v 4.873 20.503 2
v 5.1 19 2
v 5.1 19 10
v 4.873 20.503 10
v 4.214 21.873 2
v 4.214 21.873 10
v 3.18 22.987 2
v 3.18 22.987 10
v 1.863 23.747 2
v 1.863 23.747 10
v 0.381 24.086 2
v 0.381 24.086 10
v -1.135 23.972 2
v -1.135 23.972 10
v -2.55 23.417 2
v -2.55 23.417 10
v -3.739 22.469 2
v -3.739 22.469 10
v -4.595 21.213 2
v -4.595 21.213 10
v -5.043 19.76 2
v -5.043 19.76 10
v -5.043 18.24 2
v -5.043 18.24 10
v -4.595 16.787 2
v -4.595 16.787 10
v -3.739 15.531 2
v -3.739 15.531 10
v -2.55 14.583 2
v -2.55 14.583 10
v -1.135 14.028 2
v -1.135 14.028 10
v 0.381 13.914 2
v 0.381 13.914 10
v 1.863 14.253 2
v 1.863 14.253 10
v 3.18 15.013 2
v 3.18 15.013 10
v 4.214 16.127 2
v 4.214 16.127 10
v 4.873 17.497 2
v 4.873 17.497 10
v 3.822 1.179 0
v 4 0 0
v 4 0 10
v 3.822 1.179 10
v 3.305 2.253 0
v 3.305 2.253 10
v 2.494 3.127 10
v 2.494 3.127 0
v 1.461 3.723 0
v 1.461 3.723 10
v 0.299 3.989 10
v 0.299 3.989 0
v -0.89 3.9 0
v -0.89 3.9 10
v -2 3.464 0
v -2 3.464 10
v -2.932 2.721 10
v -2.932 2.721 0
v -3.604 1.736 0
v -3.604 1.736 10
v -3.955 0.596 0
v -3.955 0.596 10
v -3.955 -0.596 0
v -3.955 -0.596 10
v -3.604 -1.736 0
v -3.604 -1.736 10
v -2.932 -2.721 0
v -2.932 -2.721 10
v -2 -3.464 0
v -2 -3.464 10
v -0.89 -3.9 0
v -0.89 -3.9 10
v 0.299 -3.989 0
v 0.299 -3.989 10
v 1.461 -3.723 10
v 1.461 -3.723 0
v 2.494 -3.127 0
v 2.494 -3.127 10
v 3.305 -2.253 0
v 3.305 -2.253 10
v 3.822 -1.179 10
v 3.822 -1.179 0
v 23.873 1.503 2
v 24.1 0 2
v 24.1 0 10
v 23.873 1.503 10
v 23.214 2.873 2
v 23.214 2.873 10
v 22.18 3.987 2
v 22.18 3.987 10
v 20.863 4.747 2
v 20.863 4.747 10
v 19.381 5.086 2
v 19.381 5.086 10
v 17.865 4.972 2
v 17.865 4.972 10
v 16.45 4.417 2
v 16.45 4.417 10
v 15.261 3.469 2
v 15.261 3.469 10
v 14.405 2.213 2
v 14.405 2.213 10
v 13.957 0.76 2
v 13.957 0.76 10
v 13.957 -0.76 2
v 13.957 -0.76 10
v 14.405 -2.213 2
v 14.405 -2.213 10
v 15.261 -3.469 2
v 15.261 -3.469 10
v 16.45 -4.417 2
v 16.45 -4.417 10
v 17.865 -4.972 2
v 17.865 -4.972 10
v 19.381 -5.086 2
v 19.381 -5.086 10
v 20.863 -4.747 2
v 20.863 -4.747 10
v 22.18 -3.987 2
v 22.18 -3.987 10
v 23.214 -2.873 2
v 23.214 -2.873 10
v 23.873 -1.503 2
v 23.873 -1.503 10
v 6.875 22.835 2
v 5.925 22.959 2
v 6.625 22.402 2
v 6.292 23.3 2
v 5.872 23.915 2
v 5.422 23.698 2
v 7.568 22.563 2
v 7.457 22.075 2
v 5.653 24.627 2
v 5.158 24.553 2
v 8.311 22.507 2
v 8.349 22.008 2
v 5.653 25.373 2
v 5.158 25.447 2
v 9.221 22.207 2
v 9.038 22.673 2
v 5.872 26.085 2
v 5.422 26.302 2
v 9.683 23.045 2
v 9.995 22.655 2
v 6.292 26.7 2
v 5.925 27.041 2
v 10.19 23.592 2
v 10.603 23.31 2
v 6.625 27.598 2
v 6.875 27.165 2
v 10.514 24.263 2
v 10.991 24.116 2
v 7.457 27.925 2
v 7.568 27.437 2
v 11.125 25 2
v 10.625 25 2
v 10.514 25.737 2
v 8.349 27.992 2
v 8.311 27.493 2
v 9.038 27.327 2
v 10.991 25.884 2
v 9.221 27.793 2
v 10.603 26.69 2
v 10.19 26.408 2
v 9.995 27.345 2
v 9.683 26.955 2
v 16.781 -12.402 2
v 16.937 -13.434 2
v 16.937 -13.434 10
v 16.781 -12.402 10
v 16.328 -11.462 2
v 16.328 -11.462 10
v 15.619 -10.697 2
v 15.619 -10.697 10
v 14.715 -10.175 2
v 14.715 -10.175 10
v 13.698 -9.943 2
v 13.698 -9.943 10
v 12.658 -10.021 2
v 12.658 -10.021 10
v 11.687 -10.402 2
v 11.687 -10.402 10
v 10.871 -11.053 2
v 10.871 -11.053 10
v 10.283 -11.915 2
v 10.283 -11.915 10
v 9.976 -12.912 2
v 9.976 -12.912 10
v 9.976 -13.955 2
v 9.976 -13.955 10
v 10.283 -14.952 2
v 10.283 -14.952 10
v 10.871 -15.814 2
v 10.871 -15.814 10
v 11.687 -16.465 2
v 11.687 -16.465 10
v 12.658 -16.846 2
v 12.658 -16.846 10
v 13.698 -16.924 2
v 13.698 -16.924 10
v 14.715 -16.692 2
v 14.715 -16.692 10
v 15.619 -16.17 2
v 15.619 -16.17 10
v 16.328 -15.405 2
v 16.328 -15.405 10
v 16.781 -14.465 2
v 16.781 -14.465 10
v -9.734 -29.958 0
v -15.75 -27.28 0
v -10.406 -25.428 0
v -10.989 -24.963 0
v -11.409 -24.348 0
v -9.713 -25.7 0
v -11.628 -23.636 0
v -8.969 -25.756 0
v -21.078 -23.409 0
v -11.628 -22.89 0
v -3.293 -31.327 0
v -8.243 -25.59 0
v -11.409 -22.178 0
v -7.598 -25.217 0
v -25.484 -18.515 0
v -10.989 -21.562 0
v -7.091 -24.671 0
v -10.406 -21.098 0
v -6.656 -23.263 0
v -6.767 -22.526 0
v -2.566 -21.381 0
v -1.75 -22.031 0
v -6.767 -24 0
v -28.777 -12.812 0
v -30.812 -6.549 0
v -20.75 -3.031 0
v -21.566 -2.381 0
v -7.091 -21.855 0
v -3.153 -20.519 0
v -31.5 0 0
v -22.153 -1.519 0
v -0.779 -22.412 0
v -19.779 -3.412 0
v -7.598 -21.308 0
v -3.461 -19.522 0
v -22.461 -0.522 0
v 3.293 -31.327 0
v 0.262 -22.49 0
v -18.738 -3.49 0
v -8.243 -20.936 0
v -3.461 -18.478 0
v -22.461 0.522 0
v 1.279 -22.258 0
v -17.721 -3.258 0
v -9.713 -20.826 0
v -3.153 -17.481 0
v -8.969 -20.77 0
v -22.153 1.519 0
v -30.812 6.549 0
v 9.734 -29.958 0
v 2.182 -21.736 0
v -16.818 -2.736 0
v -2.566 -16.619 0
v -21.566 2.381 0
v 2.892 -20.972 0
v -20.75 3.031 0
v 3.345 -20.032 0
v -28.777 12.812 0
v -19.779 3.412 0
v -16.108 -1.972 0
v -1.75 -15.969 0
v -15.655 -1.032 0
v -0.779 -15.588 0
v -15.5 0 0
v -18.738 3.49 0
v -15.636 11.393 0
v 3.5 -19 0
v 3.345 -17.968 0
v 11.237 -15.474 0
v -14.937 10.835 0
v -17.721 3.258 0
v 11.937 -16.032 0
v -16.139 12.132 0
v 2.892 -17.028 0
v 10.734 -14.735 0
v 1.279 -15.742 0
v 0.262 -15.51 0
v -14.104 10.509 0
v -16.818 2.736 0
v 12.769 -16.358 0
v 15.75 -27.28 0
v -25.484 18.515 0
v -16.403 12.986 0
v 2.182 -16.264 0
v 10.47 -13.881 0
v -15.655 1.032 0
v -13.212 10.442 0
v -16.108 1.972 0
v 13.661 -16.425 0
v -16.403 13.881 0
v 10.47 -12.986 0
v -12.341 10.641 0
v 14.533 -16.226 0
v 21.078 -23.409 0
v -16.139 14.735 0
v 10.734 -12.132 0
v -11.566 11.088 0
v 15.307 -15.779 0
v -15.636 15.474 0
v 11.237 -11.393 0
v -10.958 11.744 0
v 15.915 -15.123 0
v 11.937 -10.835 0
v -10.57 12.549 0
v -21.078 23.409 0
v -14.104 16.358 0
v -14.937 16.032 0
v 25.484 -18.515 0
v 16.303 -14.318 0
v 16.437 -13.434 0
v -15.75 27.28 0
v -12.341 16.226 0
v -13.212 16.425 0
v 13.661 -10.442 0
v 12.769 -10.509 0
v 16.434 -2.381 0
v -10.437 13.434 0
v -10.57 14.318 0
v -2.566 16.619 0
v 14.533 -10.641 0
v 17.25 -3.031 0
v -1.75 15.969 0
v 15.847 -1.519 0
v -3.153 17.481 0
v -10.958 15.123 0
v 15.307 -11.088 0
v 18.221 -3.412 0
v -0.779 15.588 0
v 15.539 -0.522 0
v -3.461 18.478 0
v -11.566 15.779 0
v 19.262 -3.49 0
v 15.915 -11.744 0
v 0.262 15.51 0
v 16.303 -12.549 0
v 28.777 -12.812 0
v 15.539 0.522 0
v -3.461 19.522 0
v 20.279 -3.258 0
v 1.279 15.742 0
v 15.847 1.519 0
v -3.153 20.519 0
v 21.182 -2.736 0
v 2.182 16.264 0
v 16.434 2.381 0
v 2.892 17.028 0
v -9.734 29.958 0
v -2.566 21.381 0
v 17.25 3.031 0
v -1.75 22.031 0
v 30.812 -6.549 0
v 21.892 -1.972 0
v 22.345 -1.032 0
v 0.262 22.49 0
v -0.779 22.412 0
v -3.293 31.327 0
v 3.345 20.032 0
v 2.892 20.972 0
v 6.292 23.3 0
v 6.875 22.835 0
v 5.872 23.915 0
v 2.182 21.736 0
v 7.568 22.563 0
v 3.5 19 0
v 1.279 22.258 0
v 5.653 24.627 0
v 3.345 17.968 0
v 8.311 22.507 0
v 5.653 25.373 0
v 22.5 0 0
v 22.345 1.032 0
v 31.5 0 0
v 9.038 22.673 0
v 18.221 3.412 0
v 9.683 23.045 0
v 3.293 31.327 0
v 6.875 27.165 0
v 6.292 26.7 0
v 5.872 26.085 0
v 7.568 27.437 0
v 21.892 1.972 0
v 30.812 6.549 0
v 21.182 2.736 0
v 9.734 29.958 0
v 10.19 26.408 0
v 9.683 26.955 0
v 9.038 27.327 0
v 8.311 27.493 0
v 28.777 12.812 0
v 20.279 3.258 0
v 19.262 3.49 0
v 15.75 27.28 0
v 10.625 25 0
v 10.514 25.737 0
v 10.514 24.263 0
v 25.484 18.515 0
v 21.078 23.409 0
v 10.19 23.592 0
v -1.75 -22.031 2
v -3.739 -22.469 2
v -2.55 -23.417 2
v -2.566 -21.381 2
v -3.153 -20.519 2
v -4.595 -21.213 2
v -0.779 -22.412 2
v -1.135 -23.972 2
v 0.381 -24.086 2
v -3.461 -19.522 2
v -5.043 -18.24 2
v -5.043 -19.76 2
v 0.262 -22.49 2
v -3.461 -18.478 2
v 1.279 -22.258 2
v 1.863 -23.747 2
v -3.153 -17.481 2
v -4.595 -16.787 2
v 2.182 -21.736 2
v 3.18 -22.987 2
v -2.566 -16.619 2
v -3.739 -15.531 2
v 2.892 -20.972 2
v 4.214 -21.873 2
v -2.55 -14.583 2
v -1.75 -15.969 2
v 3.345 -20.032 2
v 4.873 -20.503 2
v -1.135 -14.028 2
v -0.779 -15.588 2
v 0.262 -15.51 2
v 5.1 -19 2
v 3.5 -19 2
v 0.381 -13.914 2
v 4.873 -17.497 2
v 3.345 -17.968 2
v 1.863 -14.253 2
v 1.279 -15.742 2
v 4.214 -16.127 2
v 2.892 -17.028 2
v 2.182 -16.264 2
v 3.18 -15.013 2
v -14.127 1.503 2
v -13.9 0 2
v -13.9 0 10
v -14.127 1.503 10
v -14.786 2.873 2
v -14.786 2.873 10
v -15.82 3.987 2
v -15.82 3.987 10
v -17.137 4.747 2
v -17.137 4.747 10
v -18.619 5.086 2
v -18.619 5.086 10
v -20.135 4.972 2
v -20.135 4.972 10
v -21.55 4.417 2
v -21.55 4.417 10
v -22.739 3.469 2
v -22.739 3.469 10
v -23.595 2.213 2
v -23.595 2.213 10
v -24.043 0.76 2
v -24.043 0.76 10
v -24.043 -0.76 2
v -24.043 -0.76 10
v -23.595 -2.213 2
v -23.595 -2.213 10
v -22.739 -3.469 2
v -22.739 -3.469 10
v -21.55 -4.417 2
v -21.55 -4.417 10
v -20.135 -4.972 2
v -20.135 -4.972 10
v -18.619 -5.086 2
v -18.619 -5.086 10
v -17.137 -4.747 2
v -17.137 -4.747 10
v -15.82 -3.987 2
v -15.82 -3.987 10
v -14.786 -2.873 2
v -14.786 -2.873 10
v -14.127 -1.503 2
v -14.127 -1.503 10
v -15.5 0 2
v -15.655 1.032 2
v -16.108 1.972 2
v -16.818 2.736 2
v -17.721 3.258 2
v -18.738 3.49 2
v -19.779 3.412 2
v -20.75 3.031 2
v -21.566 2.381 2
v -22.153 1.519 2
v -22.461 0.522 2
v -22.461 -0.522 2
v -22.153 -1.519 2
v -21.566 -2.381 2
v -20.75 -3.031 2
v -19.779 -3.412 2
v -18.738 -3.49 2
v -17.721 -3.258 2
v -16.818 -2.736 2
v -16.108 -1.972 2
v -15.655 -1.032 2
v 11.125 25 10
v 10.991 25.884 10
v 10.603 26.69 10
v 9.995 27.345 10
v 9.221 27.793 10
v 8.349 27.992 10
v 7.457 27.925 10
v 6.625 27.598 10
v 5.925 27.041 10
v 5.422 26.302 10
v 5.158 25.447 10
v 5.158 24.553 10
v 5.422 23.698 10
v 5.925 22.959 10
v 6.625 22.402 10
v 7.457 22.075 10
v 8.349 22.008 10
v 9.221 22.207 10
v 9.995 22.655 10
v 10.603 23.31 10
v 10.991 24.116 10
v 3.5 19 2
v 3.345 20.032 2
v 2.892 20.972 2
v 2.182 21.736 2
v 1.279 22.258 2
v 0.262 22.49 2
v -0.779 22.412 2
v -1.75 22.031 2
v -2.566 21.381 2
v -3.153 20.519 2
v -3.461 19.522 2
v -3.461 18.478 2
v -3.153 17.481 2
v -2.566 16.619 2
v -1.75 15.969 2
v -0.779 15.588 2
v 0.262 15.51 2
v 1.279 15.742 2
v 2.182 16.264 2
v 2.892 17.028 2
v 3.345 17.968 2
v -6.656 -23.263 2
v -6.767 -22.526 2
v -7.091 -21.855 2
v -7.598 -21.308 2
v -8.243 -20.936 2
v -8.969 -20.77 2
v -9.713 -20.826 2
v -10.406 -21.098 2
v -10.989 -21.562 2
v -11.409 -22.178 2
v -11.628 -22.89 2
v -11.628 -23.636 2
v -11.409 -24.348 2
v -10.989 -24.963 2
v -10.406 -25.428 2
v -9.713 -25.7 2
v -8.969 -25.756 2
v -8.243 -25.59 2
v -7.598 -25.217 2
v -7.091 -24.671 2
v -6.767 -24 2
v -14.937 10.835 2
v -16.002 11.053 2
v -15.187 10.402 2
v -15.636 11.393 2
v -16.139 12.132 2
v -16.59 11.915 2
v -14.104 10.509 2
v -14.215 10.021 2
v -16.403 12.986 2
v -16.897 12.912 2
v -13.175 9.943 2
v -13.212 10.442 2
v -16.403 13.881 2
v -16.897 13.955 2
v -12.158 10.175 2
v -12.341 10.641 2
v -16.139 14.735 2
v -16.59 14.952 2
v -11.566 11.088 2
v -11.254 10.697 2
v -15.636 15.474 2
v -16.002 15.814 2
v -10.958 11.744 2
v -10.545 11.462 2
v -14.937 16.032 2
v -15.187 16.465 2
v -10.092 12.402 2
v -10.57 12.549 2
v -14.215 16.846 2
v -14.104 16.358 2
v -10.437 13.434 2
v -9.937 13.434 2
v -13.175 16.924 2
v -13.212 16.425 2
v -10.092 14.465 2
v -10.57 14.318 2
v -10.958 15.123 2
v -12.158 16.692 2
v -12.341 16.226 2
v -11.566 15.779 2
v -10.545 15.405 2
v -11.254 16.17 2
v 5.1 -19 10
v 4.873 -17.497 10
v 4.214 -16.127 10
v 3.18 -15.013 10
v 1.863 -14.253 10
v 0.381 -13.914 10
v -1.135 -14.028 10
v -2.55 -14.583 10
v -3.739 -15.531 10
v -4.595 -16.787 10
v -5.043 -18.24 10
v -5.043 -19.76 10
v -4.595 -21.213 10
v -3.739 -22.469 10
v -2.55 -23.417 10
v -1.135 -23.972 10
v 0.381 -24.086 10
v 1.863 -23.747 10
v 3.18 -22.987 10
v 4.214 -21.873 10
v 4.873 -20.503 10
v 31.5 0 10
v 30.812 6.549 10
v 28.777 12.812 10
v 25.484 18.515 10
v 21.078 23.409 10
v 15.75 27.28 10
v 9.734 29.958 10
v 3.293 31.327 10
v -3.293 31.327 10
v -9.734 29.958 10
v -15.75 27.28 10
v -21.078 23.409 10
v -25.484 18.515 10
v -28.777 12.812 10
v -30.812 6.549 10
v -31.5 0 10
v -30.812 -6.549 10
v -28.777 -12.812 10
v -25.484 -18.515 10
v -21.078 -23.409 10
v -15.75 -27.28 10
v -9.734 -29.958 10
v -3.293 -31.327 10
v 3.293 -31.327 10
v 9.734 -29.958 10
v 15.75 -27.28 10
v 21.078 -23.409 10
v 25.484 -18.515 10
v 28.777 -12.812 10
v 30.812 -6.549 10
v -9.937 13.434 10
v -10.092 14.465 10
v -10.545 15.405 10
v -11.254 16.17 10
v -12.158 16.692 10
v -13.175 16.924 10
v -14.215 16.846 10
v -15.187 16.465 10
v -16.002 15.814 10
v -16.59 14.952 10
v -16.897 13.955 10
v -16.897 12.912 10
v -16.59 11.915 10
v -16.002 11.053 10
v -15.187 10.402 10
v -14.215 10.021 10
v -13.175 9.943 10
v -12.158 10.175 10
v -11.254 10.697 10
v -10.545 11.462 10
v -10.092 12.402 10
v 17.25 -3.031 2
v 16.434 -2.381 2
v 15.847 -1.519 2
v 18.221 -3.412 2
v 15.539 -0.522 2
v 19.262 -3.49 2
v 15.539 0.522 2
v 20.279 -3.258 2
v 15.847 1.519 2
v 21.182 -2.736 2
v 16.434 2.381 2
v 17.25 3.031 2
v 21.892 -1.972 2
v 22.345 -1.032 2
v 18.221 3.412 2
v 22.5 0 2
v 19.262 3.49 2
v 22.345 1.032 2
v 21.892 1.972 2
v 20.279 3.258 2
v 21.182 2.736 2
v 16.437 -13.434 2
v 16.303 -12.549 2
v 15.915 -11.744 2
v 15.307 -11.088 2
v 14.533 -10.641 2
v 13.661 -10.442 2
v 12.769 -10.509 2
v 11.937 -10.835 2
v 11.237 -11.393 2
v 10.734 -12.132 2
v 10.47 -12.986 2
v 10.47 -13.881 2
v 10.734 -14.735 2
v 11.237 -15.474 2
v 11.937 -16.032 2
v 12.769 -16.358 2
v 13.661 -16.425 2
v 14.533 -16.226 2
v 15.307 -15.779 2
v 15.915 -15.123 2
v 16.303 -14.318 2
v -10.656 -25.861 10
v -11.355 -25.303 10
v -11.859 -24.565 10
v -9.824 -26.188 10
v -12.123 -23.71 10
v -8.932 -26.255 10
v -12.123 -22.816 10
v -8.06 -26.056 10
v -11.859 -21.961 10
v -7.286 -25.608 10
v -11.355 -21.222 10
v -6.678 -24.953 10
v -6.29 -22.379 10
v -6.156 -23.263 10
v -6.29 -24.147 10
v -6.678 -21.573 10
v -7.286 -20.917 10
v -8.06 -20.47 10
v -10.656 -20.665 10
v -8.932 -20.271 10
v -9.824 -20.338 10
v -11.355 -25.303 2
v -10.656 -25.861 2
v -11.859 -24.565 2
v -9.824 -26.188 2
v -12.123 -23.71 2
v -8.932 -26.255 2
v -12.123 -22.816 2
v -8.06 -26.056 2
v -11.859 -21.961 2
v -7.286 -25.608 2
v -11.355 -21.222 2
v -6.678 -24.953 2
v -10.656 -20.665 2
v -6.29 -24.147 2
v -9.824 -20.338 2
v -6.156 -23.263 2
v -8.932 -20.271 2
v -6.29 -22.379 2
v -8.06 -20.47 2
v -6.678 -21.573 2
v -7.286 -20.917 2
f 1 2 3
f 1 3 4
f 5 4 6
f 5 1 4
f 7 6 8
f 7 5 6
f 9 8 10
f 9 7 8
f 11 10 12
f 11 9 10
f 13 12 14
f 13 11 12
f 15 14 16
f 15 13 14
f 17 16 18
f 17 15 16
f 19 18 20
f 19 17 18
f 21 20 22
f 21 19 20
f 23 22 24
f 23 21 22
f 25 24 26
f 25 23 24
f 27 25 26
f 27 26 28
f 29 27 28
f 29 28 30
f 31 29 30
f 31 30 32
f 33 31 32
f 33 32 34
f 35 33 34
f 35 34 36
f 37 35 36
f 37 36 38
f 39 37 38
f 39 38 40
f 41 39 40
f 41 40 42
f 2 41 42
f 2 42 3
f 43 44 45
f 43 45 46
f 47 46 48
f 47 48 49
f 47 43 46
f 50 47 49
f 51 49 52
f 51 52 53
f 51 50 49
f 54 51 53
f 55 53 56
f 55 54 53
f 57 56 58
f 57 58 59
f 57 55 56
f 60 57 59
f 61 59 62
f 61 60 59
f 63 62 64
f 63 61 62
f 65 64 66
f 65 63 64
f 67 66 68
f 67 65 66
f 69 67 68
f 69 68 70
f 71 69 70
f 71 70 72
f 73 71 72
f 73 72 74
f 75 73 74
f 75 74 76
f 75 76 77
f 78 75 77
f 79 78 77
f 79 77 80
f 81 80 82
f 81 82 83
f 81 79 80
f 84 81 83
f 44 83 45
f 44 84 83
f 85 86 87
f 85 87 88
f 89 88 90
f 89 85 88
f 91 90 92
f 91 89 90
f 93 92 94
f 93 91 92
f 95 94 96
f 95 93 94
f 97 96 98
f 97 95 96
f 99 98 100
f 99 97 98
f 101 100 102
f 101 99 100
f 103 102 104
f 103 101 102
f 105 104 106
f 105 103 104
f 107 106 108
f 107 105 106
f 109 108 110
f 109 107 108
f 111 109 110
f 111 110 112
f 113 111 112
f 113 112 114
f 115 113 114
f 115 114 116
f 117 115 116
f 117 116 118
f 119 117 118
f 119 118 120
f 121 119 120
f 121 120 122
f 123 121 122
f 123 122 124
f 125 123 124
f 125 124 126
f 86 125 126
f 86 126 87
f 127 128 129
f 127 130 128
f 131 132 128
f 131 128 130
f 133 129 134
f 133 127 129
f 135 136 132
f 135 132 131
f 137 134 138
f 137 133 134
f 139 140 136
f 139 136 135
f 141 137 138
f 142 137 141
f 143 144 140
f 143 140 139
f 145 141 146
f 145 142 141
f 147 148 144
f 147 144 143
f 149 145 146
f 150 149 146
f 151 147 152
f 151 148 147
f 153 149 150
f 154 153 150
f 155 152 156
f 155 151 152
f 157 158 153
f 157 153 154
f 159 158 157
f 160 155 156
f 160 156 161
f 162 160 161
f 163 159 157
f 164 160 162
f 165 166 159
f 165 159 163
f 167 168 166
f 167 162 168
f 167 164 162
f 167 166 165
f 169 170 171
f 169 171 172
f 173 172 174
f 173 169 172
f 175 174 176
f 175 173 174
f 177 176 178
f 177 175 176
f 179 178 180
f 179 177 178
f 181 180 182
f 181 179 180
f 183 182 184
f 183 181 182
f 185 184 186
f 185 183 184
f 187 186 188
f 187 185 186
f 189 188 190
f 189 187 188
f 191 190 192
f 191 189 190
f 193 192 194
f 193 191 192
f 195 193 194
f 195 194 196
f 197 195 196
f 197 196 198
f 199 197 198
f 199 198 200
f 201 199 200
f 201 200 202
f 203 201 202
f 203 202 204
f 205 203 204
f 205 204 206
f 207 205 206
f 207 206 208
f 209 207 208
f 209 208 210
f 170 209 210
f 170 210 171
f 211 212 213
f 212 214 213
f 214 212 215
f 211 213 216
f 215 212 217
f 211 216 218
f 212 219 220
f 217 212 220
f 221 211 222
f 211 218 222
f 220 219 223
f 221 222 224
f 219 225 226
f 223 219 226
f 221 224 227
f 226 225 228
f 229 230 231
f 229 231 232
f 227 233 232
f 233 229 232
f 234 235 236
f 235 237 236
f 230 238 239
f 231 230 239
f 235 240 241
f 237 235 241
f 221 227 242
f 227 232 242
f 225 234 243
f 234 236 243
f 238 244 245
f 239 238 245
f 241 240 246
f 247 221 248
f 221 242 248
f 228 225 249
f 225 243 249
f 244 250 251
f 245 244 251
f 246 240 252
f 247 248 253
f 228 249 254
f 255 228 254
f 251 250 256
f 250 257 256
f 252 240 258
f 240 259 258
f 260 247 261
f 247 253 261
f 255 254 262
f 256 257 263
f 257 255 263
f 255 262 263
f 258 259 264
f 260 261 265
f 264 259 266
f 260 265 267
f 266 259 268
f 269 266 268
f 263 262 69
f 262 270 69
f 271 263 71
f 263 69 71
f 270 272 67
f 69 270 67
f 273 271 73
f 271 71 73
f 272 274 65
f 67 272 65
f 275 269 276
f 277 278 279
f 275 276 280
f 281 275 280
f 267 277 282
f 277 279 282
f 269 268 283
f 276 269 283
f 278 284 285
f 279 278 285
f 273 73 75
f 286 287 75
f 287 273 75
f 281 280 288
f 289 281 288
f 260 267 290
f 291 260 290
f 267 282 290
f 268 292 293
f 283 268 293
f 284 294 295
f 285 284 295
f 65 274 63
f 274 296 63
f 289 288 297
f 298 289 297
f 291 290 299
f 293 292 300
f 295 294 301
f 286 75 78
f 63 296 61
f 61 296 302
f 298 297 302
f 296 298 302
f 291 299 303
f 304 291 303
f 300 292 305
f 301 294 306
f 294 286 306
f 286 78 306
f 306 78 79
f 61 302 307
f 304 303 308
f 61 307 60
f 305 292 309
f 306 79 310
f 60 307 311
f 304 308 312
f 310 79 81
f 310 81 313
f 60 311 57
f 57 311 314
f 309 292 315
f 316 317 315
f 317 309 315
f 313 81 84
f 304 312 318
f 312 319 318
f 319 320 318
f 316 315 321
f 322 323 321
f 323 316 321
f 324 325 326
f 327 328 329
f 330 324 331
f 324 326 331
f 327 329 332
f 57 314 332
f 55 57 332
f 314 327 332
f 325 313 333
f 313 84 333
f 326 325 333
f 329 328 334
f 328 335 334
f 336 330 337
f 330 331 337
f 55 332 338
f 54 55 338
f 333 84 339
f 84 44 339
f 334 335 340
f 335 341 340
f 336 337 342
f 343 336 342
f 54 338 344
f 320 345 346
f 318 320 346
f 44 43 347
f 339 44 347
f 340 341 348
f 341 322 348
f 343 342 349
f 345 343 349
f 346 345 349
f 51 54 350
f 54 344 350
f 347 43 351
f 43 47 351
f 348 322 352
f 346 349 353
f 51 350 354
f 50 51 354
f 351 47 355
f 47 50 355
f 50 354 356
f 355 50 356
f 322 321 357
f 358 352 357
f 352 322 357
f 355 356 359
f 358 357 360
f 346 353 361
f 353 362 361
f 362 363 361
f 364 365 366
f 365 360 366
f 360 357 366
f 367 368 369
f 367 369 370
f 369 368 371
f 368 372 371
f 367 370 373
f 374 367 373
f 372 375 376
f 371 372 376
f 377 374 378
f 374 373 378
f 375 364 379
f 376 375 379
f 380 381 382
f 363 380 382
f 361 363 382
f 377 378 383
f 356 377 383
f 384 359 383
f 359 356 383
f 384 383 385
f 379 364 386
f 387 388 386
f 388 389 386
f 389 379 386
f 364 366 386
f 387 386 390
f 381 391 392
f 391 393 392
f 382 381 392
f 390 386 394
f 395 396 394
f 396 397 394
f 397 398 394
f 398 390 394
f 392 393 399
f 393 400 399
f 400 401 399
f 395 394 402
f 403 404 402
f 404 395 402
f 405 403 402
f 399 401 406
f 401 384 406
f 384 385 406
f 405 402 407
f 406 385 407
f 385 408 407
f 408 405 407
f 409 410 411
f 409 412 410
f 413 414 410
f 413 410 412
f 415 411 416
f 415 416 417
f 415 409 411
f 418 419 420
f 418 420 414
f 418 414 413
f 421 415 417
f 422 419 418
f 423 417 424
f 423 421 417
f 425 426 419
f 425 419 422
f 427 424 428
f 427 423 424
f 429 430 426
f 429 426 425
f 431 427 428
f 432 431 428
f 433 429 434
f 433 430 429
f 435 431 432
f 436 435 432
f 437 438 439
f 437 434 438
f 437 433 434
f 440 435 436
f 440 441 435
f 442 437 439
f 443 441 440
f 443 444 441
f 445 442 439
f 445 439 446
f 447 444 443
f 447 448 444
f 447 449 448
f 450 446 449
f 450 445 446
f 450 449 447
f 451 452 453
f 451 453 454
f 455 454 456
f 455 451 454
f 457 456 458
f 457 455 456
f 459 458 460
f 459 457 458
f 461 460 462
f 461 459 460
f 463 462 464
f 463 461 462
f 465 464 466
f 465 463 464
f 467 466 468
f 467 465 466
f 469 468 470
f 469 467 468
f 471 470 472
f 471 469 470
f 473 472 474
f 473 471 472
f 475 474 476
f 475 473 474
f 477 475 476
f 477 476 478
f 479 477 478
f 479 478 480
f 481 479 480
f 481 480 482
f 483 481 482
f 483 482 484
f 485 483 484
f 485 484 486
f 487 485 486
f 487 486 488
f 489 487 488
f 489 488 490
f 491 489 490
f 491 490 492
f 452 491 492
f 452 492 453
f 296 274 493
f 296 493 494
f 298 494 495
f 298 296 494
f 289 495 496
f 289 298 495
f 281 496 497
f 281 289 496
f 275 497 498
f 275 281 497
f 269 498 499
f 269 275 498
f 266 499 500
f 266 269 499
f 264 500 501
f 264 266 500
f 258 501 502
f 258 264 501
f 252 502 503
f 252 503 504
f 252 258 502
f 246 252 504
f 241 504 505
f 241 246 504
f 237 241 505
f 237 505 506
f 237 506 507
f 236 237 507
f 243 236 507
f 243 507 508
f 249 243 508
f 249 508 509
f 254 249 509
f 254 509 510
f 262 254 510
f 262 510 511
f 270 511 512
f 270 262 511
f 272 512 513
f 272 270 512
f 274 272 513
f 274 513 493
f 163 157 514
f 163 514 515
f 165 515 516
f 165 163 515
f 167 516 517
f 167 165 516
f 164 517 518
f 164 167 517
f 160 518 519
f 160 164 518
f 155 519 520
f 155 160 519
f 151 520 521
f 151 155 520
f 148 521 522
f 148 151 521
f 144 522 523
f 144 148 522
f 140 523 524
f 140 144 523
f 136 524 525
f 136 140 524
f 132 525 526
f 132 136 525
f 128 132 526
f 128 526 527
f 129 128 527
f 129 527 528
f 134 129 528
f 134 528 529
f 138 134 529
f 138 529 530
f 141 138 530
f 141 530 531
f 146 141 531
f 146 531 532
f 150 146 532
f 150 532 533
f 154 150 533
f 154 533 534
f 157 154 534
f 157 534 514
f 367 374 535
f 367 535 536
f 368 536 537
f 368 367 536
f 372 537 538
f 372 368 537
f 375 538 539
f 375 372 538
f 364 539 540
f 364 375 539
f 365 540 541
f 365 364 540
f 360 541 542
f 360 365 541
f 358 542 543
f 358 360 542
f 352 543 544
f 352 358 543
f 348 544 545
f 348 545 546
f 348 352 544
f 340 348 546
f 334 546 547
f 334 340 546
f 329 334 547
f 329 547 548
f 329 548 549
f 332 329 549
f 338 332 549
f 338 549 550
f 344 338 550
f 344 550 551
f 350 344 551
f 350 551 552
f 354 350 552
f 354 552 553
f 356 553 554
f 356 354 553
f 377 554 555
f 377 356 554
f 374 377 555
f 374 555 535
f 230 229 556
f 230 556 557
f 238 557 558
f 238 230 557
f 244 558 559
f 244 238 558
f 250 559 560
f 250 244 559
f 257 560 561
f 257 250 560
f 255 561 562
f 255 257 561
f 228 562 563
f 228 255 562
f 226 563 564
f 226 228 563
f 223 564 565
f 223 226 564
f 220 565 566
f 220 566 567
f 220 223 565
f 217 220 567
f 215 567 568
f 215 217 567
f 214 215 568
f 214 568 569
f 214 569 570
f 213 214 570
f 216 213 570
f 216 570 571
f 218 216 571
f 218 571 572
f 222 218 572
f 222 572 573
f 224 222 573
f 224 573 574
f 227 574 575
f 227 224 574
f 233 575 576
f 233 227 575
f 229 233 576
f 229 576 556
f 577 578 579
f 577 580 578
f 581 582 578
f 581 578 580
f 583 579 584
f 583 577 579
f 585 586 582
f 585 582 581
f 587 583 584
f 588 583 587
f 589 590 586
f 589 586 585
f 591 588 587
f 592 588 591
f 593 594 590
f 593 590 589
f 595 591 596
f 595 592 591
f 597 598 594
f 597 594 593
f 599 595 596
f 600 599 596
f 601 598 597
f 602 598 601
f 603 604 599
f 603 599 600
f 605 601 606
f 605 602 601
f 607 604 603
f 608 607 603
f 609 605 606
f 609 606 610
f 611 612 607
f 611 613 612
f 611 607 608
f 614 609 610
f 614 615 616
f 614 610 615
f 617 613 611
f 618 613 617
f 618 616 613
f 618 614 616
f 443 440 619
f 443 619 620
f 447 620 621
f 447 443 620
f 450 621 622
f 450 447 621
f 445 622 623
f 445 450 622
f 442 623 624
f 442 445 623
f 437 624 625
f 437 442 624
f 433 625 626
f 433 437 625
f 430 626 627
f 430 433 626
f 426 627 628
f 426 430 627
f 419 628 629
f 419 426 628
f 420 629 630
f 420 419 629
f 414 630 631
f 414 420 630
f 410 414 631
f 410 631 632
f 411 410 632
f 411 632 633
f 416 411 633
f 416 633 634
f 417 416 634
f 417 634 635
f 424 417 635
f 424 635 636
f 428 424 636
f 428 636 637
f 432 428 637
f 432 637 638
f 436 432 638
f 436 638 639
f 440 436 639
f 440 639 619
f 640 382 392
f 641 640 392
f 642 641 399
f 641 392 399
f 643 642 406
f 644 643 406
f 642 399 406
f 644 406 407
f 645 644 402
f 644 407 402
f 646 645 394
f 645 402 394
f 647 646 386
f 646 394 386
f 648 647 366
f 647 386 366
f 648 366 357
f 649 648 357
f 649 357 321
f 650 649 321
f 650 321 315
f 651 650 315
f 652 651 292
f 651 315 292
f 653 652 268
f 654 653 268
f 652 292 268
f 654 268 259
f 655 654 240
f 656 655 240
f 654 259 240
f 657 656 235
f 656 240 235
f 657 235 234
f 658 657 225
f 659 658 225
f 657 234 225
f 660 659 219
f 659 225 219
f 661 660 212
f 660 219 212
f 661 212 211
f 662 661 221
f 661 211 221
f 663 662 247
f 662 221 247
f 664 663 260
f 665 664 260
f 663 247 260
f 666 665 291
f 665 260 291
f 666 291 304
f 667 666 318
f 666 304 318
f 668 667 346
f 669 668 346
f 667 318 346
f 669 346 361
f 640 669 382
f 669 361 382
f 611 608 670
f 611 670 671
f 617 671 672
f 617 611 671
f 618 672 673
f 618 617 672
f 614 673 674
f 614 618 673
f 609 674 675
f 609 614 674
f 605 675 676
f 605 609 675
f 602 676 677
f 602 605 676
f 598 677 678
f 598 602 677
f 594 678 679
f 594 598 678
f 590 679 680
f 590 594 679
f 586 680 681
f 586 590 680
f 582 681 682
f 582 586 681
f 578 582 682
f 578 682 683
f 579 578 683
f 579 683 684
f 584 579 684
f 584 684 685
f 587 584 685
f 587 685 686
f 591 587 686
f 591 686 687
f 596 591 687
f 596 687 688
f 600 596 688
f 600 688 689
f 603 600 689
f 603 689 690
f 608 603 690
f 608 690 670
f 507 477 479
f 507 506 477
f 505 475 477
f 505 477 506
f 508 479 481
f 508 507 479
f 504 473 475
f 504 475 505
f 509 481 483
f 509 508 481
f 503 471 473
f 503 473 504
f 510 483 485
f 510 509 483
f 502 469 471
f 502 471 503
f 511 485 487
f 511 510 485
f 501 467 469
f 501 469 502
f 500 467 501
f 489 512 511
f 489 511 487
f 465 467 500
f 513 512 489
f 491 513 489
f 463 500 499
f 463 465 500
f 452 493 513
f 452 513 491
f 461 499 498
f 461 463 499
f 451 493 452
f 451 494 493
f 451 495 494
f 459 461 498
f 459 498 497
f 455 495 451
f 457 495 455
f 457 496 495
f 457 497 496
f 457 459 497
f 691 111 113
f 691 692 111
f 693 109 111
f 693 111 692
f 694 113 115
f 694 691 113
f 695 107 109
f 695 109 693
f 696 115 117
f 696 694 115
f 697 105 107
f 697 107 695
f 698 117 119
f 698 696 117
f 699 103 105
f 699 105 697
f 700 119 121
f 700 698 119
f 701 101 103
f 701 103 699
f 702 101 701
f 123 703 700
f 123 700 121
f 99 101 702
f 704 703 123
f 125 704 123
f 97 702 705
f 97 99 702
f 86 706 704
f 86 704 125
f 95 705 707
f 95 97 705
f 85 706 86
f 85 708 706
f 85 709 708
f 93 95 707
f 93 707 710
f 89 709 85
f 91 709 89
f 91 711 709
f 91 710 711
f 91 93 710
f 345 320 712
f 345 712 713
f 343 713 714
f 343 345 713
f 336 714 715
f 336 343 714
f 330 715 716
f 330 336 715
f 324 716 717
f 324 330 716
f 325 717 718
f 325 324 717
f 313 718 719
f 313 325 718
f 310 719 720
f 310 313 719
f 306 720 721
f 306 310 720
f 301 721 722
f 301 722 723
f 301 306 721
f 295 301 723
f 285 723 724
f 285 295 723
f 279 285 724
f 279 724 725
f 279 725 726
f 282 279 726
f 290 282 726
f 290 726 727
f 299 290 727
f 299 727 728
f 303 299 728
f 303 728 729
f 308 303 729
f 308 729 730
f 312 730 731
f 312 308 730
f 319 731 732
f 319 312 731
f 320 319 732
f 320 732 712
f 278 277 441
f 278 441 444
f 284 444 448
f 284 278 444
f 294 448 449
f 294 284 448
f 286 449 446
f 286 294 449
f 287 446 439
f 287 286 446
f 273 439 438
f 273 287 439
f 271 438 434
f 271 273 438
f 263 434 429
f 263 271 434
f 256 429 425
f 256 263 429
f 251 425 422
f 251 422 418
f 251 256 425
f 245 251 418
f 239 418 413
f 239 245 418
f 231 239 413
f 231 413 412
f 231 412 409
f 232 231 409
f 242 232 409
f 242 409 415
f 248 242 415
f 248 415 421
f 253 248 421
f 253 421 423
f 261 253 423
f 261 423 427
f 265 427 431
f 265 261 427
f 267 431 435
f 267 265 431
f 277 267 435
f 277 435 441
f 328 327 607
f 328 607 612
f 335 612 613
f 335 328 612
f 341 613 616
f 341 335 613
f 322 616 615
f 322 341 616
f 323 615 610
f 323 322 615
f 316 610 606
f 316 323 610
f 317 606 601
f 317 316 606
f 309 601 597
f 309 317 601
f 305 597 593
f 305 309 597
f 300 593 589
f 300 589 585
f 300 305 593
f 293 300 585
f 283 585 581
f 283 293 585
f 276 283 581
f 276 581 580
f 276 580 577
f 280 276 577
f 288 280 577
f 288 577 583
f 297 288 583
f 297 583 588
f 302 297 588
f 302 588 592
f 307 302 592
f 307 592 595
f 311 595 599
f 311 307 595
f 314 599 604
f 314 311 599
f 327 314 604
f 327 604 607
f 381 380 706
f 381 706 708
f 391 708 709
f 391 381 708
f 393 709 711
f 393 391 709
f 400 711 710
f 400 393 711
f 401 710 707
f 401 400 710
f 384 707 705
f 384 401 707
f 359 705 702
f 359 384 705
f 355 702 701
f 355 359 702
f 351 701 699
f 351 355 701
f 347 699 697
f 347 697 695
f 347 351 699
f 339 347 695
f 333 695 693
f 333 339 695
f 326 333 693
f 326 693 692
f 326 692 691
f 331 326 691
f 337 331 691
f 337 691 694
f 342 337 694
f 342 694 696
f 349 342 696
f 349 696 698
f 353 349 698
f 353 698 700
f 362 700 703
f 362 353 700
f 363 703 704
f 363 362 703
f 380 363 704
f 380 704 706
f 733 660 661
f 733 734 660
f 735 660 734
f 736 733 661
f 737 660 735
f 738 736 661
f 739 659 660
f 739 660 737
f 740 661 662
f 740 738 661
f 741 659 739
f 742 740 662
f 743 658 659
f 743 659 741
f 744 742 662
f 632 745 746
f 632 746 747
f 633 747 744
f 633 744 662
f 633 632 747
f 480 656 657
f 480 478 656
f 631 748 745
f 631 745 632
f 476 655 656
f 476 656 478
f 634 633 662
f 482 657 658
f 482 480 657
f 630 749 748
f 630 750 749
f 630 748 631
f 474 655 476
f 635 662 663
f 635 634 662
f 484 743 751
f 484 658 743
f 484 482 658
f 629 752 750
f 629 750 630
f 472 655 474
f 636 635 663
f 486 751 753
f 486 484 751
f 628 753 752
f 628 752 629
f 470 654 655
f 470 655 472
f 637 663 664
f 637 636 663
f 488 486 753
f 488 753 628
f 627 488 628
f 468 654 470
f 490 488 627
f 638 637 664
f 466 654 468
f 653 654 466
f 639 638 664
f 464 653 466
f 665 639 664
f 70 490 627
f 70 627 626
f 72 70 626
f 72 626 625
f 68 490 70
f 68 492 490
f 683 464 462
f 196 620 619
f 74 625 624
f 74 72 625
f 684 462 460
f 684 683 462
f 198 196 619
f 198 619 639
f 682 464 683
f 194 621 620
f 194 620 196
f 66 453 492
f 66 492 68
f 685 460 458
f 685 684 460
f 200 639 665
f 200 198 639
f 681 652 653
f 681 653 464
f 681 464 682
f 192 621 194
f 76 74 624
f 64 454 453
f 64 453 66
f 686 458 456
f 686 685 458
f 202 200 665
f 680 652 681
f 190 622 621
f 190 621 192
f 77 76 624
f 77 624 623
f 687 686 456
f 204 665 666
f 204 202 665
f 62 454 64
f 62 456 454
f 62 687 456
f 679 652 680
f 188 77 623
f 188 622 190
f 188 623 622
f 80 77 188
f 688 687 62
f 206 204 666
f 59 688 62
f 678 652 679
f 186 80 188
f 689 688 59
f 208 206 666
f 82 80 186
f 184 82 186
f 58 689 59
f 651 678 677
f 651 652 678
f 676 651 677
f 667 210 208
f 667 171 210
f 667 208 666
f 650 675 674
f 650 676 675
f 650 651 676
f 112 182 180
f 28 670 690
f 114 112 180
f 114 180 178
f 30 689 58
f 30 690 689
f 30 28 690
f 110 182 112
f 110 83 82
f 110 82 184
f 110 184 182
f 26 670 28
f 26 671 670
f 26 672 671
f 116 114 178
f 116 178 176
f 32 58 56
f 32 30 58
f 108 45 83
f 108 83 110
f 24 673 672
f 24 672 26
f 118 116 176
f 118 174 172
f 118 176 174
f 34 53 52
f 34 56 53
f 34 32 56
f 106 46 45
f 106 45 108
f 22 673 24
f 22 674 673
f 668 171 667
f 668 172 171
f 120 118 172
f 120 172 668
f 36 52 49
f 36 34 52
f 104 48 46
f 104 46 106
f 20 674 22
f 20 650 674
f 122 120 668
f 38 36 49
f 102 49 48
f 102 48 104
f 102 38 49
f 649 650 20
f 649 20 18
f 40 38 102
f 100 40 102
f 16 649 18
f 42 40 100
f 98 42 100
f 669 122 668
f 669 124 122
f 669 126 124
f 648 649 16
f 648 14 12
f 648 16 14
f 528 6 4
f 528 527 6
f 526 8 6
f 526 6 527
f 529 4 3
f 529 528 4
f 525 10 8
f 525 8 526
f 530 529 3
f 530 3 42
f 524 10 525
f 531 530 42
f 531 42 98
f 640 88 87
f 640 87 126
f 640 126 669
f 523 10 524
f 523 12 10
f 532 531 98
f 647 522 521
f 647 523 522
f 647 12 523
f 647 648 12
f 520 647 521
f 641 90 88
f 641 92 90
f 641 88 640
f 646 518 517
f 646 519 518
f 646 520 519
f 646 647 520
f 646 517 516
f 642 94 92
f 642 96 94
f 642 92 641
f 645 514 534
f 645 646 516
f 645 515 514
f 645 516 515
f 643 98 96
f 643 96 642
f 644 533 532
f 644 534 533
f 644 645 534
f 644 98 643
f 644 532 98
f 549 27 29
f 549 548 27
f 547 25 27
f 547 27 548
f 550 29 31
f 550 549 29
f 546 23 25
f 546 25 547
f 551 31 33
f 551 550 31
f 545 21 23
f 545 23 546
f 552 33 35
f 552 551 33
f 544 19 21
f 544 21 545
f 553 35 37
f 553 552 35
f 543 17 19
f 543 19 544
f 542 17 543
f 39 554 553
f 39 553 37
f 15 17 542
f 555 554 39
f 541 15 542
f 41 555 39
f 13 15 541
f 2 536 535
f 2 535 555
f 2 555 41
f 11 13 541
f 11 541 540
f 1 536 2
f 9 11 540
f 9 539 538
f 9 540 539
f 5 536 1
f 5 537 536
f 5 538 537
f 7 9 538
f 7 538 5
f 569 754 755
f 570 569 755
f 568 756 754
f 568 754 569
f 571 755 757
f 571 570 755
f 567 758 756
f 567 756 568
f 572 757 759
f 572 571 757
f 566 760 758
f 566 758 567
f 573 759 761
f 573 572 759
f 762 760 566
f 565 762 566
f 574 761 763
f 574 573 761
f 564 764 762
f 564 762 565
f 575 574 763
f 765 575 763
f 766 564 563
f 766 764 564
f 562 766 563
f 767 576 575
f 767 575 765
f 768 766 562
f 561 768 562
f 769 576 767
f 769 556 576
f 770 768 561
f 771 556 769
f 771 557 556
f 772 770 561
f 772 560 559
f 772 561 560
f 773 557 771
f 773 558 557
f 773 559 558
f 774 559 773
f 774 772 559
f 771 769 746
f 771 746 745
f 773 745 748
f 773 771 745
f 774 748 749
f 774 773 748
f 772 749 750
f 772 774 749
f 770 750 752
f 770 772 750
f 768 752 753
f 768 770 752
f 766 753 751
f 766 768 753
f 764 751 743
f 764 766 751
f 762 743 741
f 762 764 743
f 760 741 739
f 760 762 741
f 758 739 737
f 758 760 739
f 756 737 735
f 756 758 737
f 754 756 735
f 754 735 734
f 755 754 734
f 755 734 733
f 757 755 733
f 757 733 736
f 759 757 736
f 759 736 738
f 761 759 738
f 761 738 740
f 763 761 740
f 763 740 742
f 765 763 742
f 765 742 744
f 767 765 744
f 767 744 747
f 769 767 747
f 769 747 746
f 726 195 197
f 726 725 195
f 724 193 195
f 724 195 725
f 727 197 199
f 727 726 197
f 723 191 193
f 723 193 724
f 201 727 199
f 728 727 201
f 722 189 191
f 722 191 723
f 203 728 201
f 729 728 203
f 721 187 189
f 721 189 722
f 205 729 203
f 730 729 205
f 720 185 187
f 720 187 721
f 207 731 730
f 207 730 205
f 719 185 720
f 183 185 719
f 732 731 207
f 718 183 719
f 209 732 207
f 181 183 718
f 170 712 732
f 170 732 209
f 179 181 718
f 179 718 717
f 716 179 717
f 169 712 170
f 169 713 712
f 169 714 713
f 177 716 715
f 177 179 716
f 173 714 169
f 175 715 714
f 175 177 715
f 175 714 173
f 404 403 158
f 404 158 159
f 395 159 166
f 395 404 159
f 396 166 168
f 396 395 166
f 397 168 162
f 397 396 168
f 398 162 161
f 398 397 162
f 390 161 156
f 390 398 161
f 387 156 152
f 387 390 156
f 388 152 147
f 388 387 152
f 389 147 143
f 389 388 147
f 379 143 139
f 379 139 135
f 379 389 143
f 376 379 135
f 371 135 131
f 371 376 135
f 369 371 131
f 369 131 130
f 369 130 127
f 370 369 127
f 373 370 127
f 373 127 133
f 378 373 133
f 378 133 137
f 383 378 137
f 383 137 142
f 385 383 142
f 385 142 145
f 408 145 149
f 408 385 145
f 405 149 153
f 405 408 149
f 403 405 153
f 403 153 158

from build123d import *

# Parameters (mm, degrees)
SKETCH1_R           = 31.5
SKETCH1_R_2         = 3.000009018
SKETCH1_R_3         = 5.1
SKETCH1_R_4         = 3.5
SKETCH1_R_5         = 3
SKETCH1_R_6         = 4
BOSS_EXTRUDE1_DEPTH = 10
SKETCH1_3_R         = 5.1
SKETCH1_3_R_2       = 3.5
SKETCH1_3_R_3       = 3
SKETCH1_3_R_4       = 2.5
SKETCH1_3_R_5       = 3.000009018
BOSS_EXTRUDE2_DEPTH = 2


with BuildPart() as part:
    # Sketch1 → Boss-Extrude1 (new body)
    with BuildSketch(Plane.XY):
        Circle(SKETCH1_R)
        with Locations((-9.156294472, -23.262894737)):
            Circle(SKETCH1_R_2, mode=Mode.SUBTRACT)
        with Locations((0, 19)):
            Circle(SKETCH1_R_3, mode=Mode.SUBTRACT)
        with Locations((-13.436536842, 13.433520674)):
            Circle(SKETCH1_R_4, mode=Mode.SUBTRACT)
        with Locations((-19, 0)):
            Circle(SKETCH1_R_3, mode=Mode.SUBTRACT)
        with Locations((0, -19)):
            Circle(SKETCH1_R_3, mode=Mode.SUBTRACT)
        with Locations((13.436536842, -13.433520674)):
            Circle(SKETCH1_R_4, mode=Mode.SUBTRACT)
        with Locations((19, 0)):
            Circle(SKETCH1_R_3, mode=Mode.SUBTRACT)
        with Locations((8.124653839, 25)):
            Circle(SKETCH1_R_5, mode=Mode.SUBTRACT)
        Circle(SKETCH1_R_6, mode=Mode.SUBTRACT)
    extrude(amount=BOSS_EXTRUDE1_DEPTH)

    # Sketch1<3> → Boss-Extrude2 (add)
    # profile 1 of 8: a face of its own
    with BuildSketch(Plane.XY):
        with Locations((19, 0)):
            Circle(SKETCH1_3_R)
        with Locations((19, 0)):
            Circle(SKETCH1_3_R_2, mode=Mode.SUBTRACT)
    # profile 2 of 8: a face of its own
    with BuildSketch(Plane.XY):
        with Locations((0, 19)):
            Circle(SKETCH1_3_R)
        with Locations((0, 19)):
            Circle(SKETCH1_3_R_2, mode=Mode.SUBTRACT)
    # profile 3 of 8: a face of its own
    with BuildSketch(Plane.XY):
        with Locations((13.436536842, -13.433520674)):
            Circle(SKETCH1_3_R_2)
        with Locations((13.436536842, -13.433520674)):
            Circle(SKETCH1_3_R_3, mode=Mode.SUBTRACT)
    # profile 4 of 8: a face of its own
    with BuildSketch(Plane.XY):
        with Locations((-13.436536842, 13.433520674)):
            Circle(SKETCH1_3_R_2)
        with Locations((-13.436536842, 13.433520674)):
            Circle(SKETCH1_3_R_3, mode=Mode.SUBTRACT)
    # profile 5 of 8: a face of its own
    with BuildSketch(Plane.XY):
        with Locations((0, -19)):
            Circle(SKETCH1_3_R)
        with Locations((0, -19)):
            Circle(SKETCH1_3_R_2, mode=Mode.SUBTRACT)
    # profile 6 of 8: a face of its own
    with BuildSketch(Plane.XY):
        with Locations((-19, 0)):
            Circle(SKETCH1_3_R)
        with Locations((-19, 0)):
            Circle(SKETCH1_3_R_2, mode=Mode.SUBTRACT)
    # profile 7 of 8: a face of its own
    with BuildSketch(Plane.XY):
        with Locations((8.124653839, 25)):
            Circle(SKETCH1_3_R_3)
        with Locations((8.124653839, 25)):
            Circle(SKETCH1_3_R_4, mode=Mode.SUBTRACT)
    # profile 8 of 8: a face of its own
    with BuildSketch(Plane.XY):
        with Locations((-9.156294472, -23.262894737)):
            Circle(SKETCH1_3_R_5)
        with Locations((-9.156294472, -23.262894737)):
            Circle(SKETCH1_3_R_4, mode=Mode.SUBTRACT)
    extrude(amount=BOSS_EXTRUDE2_DEPTH)


solid = part.part
